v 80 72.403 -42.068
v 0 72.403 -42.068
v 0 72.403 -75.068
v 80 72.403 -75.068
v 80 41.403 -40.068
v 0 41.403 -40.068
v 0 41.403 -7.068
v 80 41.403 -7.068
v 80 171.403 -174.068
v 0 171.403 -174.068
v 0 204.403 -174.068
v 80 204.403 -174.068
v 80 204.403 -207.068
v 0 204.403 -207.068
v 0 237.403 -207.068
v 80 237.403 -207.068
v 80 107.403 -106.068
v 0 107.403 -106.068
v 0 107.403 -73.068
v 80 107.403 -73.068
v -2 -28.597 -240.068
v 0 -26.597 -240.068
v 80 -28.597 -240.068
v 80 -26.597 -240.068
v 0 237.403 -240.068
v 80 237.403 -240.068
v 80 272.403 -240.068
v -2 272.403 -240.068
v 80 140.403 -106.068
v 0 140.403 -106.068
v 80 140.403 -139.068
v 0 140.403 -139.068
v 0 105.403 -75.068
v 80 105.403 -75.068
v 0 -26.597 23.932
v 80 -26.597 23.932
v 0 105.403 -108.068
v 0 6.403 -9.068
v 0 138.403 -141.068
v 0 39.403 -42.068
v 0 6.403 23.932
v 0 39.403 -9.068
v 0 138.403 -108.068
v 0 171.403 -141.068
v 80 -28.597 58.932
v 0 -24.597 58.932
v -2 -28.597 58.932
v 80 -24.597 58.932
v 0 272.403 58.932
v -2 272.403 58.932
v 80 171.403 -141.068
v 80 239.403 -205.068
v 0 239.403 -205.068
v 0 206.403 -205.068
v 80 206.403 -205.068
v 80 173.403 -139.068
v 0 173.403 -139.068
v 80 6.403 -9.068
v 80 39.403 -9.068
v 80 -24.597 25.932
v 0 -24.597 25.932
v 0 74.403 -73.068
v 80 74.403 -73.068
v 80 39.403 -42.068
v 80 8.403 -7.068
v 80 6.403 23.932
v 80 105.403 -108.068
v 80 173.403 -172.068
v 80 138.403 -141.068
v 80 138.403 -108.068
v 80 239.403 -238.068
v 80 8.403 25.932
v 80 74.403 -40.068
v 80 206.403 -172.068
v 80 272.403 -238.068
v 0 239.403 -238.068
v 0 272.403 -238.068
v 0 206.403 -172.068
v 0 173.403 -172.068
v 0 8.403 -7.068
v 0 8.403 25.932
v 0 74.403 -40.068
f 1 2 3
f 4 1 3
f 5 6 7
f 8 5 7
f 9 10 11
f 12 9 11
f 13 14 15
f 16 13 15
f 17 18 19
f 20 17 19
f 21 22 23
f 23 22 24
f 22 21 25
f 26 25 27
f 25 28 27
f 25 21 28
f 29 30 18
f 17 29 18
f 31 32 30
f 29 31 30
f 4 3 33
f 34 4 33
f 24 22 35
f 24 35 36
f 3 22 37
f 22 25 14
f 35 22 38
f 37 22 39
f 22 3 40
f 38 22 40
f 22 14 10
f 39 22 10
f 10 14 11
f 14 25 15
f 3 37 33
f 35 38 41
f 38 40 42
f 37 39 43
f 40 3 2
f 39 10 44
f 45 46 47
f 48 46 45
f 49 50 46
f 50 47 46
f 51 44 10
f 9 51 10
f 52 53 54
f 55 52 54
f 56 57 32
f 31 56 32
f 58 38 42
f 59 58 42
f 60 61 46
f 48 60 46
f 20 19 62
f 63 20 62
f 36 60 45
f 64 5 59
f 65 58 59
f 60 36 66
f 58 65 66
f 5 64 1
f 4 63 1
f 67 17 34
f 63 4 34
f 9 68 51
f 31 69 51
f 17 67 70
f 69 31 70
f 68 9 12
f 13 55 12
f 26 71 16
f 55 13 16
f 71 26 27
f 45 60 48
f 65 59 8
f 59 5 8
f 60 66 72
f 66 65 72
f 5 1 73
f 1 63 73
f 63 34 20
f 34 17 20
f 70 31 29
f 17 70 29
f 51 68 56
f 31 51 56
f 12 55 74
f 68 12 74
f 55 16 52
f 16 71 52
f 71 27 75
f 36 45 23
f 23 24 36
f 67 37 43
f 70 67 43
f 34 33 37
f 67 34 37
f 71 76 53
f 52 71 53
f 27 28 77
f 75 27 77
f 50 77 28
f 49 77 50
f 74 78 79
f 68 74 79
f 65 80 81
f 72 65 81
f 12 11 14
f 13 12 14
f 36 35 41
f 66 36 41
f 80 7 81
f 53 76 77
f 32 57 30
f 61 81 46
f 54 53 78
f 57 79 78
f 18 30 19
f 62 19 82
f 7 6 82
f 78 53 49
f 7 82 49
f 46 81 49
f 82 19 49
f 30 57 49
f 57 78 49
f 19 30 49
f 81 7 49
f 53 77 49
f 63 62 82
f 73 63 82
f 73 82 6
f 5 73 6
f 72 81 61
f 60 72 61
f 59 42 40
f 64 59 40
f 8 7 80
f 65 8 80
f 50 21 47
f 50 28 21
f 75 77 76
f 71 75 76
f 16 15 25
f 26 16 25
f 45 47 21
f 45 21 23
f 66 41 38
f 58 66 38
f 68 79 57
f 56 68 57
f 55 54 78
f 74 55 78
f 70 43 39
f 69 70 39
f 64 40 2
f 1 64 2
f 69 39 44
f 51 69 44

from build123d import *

# Parameters (mm, degrees)
BOSS_EXTRUDE1_DEPTH = 80
SKETCH3_W           = 299
SKETCH3_H           = 299
BOSS_EXTRUDE2_DEPTH = 2
SKETCH4_W           = 82
SKETCH4_H           = 299
BOSS_EXTRUDE3_DEPTH = 2


with BuildPart() as part:
    # Sketch1 → Boss-Extrude1 (new body)
    with BuildSketch(Plane(origin=(0, 0, 0), x_dir=(0, 0, -1), z_dir=(1, 0, 0))):
        Polygon((-23.931657395, -26.597399746), (-23.931657395, 6.402600254), (9.068342605, 6.402600254), (9.068342605, 39.402600254), (42.068342605, 39.402600254), (42.068342605, 72.402600254), (75.068342605, 72.402600254), (75.068342605, 105.402600254), (108.068342605, 105.402600254), (108.068342605, 138.402600254), (141.068342605, 138.402600254), (141.068342605, 171.402600254), (174.068342605, 171.402600254), (174.068342605, 204.402600254), (207.068342605, 204.402600254), (207.068342605, 237.402600254), (240.068342605, 237.402600254), (240.068342605, 272.402600254), (238.068342605, 272.402600254), (238.068342605, 239.402600254), (205.068342605, 239.402600254), (205.068342605, 206.402600254), (172.068342605, 206.402600254), (172.068342605, 173.402600254), (139.068342605, 173.402600254), (139.068342605, 140.402600254), (106.068342605, 140.402600254), (106.068342605, 107.402600254), (73.068342605, 107.402600254), (73.068342605, 74.402600254), (40.068342605, 74.402600254), (40.068342605, 41.402600254), (7.068342605, 41.402600254), (7.068342605, 8.402600254), (-25.931657395, 8.402600254), (-25.931657395, -24.597399746), (-58.931657395, -24.597399746), (-58.931657395, -26.597399746), align=None)
    extrude(amount=BOSS_EXTRUDE1_DEPTH)

    # Sketch3 → Boss-Extrude2 (add)
    with BuildSketch(Plane.ZY):
        with Locations((-90.568342605, 122.902600254)):
            Rectangle(SKETCH3_W, SKETCH3_H)
    extrude(amount=BOSS_EXTRUDE2_DEPTH)

    # Sketch4 → Boss-Extrude3 (add)
    with BuildSketch(Plane.XZ.offset(26.597399746)):
        with Locations((39, -90.568342605)):
            Rectangle(SKETCH4_W, SKETCH4_H)
    extrude(amount=BOSS_EXTRUDE3_DEPTH)


solid = part.part
